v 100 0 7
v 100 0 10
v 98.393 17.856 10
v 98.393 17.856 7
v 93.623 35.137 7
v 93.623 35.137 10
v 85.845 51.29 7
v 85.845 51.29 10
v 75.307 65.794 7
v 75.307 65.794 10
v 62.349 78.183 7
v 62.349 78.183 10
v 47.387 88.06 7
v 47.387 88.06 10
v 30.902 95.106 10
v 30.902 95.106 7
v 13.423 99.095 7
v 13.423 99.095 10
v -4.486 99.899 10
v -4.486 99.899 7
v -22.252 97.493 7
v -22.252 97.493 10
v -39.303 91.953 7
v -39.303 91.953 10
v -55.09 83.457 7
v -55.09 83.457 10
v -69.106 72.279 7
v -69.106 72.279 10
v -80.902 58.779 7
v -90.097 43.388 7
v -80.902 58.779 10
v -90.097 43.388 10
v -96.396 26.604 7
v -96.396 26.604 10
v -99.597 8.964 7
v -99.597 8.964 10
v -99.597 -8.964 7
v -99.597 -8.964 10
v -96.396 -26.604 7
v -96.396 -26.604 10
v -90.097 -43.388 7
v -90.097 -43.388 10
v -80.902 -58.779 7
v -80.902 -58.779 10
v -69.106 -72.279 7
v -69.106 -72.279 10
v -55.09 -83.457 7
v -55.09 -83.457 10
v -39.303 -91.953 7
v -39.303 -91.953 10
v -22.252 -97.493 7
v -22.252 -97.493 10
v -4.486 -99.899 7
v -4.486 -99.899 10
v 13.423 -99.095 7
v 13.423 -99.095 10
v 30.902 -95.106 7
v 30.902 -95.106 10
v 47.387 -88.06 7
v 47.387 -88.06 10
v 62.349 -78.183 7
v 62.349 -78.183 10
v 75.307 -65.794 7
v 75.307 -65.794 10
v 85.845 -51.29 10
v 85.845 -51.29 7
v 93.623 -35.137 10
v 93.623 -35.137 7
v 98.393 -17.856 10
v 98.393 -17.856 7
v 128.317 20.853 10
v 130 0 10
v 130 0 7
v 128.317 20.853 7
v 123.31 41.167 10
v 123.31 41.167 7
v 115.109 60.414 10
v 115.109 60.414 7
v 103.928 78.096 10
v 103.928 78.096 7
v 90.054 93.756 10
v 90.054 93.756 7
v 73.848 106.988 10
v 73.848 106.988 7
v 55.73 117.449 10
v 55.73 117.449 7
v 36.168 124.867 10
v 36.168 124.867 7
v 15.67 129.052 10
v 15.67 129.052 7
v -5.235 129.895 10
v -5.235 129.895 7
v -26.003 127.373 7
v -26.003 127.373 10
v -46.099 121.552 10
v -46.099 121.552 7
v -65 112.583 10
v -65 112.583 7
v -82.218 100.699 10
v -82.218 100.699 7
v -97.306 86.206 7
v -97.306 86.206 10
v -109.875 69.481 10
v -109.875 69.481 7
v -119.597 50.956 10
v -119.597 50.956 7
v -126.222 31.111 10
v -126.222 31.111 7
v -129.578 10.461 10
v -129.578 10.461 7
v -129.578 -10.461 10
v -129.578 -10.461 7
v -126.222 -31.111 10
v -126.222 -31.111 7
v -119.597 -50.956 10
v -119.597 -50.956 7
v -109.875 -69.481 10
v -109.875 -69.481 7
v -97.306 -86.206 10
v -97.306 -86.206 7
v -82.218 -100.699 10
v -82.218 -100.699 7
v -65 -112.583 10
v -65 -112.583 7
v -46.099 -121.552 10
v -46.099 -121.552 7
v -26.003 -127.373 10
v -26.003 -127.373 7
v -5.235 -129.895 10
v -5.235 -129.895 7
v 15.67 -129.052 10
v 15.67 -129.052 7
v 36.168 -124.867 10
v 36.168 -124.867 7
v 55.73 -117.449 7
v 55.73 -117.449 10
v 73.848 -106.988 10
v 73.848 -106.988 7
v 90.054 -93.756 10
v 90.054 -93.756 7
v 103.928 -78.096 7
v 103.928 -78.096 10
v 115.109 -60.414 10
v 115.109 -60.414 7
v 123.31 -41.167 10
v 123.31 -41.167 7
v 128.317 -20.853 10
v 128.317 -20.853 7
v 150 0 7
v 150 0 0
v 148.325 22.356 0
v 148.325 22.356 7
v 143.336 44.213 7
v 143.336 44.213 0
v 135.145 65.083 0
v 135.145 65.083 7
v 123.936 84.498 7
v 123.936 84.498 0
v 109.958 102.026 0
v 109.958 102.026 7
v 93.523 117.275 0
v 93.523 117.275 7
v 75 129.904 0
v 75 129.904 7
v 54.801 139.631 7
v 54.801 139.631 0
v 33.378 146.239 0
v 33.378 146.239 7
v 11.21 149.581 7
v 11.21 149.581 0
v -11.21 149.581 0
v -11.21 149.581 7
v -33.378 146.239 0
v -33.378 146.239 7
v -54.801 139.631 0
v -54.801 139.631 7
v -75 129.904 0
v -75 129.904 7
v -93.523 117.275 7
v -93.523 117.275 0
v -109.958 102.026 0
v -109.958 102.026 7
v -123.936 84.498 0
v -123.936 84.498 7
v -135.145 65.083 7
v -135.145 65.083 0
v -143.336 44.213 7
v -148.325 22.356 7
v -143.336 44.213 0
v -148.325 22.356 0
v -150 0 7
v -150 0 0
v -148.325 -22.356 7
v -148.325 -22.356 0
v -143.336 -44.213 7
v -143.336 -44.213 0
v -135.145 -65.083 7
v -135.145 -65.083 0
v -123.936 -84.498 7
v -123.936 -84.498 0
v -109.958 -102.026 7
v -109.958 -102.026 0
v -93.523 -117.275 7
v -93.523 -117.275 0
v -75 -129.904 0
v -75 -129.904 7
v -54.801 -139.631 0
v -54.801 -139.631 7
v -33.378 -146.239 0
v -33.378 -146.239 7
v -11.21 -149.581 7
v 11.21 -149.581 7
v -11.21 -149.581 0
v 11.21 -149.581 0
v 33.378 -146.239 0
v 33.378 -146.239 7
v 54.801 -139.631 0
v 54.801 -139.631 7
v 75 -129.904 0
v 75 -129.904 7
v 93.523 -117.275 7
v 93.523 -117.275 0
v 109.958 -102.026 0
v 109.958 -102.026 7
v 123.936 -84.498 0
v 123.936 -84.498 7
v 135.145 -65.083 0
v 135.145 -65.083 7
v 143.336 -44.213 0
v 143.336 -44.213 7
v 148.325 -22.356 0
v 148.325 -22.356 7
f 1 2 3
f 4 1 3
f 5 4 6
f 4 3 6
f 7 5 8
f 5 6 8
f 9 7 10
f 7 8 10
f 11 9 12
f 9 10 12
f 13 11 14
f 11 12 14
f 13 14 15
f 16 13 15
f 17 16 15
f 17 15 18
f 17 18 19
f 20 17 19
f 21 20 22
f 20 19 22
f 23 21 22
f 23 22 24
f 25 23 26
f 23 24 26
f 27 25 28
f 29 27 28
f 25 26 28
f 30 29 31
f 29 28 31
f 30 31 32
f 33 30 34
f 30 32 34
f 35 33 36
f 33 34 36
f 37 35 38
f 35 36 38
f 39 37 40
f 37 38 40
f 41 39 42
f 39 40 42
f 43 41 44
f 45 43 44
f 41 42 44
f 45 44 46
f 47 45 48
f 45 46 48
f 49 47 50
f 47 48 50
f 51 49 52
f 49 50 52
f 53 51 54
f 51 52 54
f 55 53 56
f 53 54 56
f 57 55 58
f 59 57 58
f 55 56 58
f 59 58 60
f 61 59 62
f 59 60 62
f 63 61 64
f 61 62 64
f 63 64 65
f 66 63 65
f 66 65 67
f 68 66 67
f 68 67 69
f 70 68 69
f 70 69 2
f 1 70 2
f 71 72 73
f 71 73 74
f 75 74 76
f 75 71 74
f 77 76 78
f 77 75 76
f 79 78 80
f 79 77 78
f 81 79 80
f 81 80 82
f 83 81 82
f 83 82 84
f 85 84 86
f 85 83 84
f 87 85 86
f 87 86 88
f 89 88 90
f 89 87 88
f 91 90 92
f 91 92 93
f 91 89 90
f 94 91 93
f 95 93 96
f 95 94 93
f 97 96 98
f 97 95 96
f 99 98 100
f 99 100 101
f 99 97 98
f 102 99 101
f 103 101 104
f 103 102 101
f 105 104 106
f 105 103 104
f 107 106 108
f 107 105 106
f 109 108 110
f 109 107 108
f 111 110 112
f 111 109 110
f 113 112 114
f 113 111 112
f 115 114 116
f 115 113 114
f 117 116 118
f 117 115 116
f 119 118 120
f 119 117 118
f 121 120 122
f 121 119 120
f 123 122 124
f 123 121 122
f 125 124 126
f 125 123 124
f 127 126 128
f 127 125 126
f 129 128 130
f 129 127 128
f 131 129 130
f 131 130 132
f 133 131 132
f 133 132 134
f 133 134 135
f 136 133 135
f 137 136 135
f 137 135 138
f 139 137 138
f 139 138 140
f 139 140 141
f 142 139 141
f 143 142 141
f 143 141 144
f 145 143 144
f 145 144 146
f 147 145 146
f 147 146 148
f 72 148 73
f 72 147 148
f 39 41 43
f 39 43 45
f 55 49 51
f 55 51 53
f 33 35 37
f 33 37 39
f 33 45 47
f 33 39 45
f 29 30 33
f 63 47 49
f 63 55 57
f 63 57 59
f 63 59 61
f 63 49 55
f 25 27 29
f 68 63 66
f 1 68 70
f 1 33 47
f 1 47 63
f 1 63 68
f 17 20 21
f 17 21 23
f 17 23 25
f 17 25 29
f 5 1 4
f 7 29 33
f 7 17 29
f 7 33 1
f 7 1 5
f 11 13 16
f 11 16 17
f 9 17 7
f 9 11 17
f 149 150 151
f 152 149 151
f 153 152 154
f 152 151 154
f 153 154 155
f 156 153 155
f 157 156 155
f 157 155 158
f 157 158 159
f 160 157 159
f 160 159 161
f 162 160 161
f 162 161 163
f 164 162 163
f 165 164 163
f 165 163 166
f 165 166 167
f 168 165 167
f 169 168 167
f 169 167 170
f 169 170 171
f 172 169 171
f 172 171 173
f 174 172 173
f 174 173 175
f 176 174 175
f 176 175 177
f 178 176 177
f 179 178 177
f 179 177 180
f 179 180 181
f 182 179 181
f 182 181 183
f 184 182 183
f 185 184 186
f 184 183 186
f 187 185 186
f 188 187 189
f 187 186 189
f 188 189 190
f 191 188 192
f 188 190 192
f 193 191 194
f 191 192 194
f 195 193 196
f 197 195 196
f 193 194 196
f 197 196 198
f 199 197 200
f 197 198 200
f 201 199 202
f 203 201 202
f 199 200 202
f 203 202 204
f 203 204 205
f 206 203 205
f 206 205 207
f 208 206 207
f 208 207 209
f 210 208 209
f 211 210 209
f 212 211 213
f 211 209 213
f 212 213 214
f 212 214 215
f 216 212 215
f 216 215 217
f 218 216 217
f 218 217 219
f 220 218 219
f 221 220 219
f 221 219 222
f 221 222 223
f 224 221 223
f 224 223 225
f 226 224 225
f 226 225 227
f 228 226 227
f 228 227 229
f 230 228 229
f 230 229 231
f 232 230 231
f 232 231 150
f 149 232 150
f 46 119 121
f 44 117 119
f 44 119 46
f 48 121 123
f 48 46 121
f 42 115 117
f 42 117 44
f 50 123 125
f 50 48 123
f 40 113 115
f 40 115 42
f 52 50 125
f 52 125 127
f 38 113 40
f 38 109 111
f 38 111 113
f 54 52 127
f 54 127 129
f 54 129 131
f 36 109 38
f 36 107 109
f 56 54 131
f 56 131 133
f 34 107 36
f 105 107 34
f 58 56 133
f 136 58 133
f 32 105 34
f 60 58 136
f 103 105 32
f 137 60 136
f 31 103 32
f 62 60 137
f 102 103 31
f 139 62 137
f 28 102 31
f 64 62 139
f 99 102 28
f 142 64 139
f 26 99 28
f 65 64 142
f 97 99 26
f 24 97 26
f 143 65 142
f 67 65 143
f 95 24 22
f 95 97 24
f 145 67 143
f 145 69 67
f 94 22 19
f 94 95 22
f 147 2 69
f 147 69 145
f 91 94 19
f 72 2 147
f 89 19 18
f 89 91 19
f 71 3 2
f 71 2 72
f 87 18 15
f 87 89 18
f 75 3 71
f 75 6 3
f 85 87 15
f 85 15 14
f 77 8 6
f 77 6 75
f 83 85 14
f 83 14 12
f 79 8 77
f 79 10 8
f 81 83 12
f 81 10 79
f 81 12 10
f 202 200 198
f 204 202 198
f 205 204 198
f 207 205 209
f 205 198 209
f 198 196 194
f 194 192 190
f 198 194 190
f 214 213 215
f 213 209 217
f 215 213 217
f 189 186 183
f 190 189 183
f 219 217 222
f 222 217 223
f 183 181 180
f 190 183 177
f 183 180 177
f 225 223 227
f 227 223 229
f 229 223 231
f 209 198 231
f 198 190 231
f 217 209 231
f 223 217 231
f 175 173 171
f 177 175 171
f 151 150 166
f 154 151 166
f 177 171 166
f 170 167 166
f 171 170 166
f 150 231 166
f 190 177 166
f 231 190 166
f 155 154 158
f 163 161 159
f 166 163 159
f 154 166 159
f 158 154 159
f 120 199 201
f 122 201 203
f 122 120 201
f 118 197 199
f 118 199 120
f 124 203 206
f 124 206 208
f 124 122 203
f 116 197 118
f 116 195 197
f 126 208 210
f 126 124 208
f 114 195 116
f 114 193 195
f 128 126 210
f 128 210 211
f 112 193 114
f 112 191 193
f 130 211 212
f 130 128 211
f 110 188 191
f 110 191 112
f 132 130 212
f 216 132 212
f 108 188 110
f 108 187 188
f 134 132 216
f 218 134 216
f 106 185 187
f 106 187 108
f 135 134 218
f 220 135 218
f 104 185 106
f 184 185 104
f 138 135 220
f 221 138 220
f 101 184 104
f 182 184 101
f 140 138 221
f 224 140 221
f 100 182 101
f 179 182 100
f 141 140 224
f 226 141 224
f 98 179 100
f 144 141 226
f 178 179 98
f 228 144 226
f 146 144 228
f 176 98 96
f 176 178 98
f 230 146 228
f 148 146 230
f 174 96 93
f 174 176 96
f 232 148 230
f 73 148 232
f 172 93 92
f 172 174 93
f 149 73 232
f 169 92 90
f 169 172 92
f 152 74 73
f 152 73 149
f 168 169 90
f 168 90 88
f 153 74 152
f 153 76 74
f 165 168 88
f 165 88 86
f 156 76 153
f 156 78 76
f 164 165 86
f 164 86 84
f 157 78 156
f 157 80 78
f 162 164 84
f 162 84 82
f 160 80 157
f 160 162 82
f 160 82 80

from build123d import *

# Parameters (mm, degrees)
F0_R     = 150
F1_DEPTH = 10
F2_R     = 150
F2_R_2   = 130
F2_R_3   = 100
F3_DEPTH = 3


with BuildPart() as f1:
    # F0 (on Top) → F1 (new body)
    with BuildSketch(Plane.XY):
        Circle(F0_R)
    extrude(amount=F1_DEPTH)

    # F2 (on face) → F3 (cut)
    with BuildSketch(Plane.XY.offset(10)):
        Circle(F2_R)
        Circle(F2_R_2, mode=Mode.SUBTRACT)
        Circle(F2_R_3)
    extrude(amount=-F3_DEPTH, mode=Mode.SUBTRACT)


solid = f1.part
